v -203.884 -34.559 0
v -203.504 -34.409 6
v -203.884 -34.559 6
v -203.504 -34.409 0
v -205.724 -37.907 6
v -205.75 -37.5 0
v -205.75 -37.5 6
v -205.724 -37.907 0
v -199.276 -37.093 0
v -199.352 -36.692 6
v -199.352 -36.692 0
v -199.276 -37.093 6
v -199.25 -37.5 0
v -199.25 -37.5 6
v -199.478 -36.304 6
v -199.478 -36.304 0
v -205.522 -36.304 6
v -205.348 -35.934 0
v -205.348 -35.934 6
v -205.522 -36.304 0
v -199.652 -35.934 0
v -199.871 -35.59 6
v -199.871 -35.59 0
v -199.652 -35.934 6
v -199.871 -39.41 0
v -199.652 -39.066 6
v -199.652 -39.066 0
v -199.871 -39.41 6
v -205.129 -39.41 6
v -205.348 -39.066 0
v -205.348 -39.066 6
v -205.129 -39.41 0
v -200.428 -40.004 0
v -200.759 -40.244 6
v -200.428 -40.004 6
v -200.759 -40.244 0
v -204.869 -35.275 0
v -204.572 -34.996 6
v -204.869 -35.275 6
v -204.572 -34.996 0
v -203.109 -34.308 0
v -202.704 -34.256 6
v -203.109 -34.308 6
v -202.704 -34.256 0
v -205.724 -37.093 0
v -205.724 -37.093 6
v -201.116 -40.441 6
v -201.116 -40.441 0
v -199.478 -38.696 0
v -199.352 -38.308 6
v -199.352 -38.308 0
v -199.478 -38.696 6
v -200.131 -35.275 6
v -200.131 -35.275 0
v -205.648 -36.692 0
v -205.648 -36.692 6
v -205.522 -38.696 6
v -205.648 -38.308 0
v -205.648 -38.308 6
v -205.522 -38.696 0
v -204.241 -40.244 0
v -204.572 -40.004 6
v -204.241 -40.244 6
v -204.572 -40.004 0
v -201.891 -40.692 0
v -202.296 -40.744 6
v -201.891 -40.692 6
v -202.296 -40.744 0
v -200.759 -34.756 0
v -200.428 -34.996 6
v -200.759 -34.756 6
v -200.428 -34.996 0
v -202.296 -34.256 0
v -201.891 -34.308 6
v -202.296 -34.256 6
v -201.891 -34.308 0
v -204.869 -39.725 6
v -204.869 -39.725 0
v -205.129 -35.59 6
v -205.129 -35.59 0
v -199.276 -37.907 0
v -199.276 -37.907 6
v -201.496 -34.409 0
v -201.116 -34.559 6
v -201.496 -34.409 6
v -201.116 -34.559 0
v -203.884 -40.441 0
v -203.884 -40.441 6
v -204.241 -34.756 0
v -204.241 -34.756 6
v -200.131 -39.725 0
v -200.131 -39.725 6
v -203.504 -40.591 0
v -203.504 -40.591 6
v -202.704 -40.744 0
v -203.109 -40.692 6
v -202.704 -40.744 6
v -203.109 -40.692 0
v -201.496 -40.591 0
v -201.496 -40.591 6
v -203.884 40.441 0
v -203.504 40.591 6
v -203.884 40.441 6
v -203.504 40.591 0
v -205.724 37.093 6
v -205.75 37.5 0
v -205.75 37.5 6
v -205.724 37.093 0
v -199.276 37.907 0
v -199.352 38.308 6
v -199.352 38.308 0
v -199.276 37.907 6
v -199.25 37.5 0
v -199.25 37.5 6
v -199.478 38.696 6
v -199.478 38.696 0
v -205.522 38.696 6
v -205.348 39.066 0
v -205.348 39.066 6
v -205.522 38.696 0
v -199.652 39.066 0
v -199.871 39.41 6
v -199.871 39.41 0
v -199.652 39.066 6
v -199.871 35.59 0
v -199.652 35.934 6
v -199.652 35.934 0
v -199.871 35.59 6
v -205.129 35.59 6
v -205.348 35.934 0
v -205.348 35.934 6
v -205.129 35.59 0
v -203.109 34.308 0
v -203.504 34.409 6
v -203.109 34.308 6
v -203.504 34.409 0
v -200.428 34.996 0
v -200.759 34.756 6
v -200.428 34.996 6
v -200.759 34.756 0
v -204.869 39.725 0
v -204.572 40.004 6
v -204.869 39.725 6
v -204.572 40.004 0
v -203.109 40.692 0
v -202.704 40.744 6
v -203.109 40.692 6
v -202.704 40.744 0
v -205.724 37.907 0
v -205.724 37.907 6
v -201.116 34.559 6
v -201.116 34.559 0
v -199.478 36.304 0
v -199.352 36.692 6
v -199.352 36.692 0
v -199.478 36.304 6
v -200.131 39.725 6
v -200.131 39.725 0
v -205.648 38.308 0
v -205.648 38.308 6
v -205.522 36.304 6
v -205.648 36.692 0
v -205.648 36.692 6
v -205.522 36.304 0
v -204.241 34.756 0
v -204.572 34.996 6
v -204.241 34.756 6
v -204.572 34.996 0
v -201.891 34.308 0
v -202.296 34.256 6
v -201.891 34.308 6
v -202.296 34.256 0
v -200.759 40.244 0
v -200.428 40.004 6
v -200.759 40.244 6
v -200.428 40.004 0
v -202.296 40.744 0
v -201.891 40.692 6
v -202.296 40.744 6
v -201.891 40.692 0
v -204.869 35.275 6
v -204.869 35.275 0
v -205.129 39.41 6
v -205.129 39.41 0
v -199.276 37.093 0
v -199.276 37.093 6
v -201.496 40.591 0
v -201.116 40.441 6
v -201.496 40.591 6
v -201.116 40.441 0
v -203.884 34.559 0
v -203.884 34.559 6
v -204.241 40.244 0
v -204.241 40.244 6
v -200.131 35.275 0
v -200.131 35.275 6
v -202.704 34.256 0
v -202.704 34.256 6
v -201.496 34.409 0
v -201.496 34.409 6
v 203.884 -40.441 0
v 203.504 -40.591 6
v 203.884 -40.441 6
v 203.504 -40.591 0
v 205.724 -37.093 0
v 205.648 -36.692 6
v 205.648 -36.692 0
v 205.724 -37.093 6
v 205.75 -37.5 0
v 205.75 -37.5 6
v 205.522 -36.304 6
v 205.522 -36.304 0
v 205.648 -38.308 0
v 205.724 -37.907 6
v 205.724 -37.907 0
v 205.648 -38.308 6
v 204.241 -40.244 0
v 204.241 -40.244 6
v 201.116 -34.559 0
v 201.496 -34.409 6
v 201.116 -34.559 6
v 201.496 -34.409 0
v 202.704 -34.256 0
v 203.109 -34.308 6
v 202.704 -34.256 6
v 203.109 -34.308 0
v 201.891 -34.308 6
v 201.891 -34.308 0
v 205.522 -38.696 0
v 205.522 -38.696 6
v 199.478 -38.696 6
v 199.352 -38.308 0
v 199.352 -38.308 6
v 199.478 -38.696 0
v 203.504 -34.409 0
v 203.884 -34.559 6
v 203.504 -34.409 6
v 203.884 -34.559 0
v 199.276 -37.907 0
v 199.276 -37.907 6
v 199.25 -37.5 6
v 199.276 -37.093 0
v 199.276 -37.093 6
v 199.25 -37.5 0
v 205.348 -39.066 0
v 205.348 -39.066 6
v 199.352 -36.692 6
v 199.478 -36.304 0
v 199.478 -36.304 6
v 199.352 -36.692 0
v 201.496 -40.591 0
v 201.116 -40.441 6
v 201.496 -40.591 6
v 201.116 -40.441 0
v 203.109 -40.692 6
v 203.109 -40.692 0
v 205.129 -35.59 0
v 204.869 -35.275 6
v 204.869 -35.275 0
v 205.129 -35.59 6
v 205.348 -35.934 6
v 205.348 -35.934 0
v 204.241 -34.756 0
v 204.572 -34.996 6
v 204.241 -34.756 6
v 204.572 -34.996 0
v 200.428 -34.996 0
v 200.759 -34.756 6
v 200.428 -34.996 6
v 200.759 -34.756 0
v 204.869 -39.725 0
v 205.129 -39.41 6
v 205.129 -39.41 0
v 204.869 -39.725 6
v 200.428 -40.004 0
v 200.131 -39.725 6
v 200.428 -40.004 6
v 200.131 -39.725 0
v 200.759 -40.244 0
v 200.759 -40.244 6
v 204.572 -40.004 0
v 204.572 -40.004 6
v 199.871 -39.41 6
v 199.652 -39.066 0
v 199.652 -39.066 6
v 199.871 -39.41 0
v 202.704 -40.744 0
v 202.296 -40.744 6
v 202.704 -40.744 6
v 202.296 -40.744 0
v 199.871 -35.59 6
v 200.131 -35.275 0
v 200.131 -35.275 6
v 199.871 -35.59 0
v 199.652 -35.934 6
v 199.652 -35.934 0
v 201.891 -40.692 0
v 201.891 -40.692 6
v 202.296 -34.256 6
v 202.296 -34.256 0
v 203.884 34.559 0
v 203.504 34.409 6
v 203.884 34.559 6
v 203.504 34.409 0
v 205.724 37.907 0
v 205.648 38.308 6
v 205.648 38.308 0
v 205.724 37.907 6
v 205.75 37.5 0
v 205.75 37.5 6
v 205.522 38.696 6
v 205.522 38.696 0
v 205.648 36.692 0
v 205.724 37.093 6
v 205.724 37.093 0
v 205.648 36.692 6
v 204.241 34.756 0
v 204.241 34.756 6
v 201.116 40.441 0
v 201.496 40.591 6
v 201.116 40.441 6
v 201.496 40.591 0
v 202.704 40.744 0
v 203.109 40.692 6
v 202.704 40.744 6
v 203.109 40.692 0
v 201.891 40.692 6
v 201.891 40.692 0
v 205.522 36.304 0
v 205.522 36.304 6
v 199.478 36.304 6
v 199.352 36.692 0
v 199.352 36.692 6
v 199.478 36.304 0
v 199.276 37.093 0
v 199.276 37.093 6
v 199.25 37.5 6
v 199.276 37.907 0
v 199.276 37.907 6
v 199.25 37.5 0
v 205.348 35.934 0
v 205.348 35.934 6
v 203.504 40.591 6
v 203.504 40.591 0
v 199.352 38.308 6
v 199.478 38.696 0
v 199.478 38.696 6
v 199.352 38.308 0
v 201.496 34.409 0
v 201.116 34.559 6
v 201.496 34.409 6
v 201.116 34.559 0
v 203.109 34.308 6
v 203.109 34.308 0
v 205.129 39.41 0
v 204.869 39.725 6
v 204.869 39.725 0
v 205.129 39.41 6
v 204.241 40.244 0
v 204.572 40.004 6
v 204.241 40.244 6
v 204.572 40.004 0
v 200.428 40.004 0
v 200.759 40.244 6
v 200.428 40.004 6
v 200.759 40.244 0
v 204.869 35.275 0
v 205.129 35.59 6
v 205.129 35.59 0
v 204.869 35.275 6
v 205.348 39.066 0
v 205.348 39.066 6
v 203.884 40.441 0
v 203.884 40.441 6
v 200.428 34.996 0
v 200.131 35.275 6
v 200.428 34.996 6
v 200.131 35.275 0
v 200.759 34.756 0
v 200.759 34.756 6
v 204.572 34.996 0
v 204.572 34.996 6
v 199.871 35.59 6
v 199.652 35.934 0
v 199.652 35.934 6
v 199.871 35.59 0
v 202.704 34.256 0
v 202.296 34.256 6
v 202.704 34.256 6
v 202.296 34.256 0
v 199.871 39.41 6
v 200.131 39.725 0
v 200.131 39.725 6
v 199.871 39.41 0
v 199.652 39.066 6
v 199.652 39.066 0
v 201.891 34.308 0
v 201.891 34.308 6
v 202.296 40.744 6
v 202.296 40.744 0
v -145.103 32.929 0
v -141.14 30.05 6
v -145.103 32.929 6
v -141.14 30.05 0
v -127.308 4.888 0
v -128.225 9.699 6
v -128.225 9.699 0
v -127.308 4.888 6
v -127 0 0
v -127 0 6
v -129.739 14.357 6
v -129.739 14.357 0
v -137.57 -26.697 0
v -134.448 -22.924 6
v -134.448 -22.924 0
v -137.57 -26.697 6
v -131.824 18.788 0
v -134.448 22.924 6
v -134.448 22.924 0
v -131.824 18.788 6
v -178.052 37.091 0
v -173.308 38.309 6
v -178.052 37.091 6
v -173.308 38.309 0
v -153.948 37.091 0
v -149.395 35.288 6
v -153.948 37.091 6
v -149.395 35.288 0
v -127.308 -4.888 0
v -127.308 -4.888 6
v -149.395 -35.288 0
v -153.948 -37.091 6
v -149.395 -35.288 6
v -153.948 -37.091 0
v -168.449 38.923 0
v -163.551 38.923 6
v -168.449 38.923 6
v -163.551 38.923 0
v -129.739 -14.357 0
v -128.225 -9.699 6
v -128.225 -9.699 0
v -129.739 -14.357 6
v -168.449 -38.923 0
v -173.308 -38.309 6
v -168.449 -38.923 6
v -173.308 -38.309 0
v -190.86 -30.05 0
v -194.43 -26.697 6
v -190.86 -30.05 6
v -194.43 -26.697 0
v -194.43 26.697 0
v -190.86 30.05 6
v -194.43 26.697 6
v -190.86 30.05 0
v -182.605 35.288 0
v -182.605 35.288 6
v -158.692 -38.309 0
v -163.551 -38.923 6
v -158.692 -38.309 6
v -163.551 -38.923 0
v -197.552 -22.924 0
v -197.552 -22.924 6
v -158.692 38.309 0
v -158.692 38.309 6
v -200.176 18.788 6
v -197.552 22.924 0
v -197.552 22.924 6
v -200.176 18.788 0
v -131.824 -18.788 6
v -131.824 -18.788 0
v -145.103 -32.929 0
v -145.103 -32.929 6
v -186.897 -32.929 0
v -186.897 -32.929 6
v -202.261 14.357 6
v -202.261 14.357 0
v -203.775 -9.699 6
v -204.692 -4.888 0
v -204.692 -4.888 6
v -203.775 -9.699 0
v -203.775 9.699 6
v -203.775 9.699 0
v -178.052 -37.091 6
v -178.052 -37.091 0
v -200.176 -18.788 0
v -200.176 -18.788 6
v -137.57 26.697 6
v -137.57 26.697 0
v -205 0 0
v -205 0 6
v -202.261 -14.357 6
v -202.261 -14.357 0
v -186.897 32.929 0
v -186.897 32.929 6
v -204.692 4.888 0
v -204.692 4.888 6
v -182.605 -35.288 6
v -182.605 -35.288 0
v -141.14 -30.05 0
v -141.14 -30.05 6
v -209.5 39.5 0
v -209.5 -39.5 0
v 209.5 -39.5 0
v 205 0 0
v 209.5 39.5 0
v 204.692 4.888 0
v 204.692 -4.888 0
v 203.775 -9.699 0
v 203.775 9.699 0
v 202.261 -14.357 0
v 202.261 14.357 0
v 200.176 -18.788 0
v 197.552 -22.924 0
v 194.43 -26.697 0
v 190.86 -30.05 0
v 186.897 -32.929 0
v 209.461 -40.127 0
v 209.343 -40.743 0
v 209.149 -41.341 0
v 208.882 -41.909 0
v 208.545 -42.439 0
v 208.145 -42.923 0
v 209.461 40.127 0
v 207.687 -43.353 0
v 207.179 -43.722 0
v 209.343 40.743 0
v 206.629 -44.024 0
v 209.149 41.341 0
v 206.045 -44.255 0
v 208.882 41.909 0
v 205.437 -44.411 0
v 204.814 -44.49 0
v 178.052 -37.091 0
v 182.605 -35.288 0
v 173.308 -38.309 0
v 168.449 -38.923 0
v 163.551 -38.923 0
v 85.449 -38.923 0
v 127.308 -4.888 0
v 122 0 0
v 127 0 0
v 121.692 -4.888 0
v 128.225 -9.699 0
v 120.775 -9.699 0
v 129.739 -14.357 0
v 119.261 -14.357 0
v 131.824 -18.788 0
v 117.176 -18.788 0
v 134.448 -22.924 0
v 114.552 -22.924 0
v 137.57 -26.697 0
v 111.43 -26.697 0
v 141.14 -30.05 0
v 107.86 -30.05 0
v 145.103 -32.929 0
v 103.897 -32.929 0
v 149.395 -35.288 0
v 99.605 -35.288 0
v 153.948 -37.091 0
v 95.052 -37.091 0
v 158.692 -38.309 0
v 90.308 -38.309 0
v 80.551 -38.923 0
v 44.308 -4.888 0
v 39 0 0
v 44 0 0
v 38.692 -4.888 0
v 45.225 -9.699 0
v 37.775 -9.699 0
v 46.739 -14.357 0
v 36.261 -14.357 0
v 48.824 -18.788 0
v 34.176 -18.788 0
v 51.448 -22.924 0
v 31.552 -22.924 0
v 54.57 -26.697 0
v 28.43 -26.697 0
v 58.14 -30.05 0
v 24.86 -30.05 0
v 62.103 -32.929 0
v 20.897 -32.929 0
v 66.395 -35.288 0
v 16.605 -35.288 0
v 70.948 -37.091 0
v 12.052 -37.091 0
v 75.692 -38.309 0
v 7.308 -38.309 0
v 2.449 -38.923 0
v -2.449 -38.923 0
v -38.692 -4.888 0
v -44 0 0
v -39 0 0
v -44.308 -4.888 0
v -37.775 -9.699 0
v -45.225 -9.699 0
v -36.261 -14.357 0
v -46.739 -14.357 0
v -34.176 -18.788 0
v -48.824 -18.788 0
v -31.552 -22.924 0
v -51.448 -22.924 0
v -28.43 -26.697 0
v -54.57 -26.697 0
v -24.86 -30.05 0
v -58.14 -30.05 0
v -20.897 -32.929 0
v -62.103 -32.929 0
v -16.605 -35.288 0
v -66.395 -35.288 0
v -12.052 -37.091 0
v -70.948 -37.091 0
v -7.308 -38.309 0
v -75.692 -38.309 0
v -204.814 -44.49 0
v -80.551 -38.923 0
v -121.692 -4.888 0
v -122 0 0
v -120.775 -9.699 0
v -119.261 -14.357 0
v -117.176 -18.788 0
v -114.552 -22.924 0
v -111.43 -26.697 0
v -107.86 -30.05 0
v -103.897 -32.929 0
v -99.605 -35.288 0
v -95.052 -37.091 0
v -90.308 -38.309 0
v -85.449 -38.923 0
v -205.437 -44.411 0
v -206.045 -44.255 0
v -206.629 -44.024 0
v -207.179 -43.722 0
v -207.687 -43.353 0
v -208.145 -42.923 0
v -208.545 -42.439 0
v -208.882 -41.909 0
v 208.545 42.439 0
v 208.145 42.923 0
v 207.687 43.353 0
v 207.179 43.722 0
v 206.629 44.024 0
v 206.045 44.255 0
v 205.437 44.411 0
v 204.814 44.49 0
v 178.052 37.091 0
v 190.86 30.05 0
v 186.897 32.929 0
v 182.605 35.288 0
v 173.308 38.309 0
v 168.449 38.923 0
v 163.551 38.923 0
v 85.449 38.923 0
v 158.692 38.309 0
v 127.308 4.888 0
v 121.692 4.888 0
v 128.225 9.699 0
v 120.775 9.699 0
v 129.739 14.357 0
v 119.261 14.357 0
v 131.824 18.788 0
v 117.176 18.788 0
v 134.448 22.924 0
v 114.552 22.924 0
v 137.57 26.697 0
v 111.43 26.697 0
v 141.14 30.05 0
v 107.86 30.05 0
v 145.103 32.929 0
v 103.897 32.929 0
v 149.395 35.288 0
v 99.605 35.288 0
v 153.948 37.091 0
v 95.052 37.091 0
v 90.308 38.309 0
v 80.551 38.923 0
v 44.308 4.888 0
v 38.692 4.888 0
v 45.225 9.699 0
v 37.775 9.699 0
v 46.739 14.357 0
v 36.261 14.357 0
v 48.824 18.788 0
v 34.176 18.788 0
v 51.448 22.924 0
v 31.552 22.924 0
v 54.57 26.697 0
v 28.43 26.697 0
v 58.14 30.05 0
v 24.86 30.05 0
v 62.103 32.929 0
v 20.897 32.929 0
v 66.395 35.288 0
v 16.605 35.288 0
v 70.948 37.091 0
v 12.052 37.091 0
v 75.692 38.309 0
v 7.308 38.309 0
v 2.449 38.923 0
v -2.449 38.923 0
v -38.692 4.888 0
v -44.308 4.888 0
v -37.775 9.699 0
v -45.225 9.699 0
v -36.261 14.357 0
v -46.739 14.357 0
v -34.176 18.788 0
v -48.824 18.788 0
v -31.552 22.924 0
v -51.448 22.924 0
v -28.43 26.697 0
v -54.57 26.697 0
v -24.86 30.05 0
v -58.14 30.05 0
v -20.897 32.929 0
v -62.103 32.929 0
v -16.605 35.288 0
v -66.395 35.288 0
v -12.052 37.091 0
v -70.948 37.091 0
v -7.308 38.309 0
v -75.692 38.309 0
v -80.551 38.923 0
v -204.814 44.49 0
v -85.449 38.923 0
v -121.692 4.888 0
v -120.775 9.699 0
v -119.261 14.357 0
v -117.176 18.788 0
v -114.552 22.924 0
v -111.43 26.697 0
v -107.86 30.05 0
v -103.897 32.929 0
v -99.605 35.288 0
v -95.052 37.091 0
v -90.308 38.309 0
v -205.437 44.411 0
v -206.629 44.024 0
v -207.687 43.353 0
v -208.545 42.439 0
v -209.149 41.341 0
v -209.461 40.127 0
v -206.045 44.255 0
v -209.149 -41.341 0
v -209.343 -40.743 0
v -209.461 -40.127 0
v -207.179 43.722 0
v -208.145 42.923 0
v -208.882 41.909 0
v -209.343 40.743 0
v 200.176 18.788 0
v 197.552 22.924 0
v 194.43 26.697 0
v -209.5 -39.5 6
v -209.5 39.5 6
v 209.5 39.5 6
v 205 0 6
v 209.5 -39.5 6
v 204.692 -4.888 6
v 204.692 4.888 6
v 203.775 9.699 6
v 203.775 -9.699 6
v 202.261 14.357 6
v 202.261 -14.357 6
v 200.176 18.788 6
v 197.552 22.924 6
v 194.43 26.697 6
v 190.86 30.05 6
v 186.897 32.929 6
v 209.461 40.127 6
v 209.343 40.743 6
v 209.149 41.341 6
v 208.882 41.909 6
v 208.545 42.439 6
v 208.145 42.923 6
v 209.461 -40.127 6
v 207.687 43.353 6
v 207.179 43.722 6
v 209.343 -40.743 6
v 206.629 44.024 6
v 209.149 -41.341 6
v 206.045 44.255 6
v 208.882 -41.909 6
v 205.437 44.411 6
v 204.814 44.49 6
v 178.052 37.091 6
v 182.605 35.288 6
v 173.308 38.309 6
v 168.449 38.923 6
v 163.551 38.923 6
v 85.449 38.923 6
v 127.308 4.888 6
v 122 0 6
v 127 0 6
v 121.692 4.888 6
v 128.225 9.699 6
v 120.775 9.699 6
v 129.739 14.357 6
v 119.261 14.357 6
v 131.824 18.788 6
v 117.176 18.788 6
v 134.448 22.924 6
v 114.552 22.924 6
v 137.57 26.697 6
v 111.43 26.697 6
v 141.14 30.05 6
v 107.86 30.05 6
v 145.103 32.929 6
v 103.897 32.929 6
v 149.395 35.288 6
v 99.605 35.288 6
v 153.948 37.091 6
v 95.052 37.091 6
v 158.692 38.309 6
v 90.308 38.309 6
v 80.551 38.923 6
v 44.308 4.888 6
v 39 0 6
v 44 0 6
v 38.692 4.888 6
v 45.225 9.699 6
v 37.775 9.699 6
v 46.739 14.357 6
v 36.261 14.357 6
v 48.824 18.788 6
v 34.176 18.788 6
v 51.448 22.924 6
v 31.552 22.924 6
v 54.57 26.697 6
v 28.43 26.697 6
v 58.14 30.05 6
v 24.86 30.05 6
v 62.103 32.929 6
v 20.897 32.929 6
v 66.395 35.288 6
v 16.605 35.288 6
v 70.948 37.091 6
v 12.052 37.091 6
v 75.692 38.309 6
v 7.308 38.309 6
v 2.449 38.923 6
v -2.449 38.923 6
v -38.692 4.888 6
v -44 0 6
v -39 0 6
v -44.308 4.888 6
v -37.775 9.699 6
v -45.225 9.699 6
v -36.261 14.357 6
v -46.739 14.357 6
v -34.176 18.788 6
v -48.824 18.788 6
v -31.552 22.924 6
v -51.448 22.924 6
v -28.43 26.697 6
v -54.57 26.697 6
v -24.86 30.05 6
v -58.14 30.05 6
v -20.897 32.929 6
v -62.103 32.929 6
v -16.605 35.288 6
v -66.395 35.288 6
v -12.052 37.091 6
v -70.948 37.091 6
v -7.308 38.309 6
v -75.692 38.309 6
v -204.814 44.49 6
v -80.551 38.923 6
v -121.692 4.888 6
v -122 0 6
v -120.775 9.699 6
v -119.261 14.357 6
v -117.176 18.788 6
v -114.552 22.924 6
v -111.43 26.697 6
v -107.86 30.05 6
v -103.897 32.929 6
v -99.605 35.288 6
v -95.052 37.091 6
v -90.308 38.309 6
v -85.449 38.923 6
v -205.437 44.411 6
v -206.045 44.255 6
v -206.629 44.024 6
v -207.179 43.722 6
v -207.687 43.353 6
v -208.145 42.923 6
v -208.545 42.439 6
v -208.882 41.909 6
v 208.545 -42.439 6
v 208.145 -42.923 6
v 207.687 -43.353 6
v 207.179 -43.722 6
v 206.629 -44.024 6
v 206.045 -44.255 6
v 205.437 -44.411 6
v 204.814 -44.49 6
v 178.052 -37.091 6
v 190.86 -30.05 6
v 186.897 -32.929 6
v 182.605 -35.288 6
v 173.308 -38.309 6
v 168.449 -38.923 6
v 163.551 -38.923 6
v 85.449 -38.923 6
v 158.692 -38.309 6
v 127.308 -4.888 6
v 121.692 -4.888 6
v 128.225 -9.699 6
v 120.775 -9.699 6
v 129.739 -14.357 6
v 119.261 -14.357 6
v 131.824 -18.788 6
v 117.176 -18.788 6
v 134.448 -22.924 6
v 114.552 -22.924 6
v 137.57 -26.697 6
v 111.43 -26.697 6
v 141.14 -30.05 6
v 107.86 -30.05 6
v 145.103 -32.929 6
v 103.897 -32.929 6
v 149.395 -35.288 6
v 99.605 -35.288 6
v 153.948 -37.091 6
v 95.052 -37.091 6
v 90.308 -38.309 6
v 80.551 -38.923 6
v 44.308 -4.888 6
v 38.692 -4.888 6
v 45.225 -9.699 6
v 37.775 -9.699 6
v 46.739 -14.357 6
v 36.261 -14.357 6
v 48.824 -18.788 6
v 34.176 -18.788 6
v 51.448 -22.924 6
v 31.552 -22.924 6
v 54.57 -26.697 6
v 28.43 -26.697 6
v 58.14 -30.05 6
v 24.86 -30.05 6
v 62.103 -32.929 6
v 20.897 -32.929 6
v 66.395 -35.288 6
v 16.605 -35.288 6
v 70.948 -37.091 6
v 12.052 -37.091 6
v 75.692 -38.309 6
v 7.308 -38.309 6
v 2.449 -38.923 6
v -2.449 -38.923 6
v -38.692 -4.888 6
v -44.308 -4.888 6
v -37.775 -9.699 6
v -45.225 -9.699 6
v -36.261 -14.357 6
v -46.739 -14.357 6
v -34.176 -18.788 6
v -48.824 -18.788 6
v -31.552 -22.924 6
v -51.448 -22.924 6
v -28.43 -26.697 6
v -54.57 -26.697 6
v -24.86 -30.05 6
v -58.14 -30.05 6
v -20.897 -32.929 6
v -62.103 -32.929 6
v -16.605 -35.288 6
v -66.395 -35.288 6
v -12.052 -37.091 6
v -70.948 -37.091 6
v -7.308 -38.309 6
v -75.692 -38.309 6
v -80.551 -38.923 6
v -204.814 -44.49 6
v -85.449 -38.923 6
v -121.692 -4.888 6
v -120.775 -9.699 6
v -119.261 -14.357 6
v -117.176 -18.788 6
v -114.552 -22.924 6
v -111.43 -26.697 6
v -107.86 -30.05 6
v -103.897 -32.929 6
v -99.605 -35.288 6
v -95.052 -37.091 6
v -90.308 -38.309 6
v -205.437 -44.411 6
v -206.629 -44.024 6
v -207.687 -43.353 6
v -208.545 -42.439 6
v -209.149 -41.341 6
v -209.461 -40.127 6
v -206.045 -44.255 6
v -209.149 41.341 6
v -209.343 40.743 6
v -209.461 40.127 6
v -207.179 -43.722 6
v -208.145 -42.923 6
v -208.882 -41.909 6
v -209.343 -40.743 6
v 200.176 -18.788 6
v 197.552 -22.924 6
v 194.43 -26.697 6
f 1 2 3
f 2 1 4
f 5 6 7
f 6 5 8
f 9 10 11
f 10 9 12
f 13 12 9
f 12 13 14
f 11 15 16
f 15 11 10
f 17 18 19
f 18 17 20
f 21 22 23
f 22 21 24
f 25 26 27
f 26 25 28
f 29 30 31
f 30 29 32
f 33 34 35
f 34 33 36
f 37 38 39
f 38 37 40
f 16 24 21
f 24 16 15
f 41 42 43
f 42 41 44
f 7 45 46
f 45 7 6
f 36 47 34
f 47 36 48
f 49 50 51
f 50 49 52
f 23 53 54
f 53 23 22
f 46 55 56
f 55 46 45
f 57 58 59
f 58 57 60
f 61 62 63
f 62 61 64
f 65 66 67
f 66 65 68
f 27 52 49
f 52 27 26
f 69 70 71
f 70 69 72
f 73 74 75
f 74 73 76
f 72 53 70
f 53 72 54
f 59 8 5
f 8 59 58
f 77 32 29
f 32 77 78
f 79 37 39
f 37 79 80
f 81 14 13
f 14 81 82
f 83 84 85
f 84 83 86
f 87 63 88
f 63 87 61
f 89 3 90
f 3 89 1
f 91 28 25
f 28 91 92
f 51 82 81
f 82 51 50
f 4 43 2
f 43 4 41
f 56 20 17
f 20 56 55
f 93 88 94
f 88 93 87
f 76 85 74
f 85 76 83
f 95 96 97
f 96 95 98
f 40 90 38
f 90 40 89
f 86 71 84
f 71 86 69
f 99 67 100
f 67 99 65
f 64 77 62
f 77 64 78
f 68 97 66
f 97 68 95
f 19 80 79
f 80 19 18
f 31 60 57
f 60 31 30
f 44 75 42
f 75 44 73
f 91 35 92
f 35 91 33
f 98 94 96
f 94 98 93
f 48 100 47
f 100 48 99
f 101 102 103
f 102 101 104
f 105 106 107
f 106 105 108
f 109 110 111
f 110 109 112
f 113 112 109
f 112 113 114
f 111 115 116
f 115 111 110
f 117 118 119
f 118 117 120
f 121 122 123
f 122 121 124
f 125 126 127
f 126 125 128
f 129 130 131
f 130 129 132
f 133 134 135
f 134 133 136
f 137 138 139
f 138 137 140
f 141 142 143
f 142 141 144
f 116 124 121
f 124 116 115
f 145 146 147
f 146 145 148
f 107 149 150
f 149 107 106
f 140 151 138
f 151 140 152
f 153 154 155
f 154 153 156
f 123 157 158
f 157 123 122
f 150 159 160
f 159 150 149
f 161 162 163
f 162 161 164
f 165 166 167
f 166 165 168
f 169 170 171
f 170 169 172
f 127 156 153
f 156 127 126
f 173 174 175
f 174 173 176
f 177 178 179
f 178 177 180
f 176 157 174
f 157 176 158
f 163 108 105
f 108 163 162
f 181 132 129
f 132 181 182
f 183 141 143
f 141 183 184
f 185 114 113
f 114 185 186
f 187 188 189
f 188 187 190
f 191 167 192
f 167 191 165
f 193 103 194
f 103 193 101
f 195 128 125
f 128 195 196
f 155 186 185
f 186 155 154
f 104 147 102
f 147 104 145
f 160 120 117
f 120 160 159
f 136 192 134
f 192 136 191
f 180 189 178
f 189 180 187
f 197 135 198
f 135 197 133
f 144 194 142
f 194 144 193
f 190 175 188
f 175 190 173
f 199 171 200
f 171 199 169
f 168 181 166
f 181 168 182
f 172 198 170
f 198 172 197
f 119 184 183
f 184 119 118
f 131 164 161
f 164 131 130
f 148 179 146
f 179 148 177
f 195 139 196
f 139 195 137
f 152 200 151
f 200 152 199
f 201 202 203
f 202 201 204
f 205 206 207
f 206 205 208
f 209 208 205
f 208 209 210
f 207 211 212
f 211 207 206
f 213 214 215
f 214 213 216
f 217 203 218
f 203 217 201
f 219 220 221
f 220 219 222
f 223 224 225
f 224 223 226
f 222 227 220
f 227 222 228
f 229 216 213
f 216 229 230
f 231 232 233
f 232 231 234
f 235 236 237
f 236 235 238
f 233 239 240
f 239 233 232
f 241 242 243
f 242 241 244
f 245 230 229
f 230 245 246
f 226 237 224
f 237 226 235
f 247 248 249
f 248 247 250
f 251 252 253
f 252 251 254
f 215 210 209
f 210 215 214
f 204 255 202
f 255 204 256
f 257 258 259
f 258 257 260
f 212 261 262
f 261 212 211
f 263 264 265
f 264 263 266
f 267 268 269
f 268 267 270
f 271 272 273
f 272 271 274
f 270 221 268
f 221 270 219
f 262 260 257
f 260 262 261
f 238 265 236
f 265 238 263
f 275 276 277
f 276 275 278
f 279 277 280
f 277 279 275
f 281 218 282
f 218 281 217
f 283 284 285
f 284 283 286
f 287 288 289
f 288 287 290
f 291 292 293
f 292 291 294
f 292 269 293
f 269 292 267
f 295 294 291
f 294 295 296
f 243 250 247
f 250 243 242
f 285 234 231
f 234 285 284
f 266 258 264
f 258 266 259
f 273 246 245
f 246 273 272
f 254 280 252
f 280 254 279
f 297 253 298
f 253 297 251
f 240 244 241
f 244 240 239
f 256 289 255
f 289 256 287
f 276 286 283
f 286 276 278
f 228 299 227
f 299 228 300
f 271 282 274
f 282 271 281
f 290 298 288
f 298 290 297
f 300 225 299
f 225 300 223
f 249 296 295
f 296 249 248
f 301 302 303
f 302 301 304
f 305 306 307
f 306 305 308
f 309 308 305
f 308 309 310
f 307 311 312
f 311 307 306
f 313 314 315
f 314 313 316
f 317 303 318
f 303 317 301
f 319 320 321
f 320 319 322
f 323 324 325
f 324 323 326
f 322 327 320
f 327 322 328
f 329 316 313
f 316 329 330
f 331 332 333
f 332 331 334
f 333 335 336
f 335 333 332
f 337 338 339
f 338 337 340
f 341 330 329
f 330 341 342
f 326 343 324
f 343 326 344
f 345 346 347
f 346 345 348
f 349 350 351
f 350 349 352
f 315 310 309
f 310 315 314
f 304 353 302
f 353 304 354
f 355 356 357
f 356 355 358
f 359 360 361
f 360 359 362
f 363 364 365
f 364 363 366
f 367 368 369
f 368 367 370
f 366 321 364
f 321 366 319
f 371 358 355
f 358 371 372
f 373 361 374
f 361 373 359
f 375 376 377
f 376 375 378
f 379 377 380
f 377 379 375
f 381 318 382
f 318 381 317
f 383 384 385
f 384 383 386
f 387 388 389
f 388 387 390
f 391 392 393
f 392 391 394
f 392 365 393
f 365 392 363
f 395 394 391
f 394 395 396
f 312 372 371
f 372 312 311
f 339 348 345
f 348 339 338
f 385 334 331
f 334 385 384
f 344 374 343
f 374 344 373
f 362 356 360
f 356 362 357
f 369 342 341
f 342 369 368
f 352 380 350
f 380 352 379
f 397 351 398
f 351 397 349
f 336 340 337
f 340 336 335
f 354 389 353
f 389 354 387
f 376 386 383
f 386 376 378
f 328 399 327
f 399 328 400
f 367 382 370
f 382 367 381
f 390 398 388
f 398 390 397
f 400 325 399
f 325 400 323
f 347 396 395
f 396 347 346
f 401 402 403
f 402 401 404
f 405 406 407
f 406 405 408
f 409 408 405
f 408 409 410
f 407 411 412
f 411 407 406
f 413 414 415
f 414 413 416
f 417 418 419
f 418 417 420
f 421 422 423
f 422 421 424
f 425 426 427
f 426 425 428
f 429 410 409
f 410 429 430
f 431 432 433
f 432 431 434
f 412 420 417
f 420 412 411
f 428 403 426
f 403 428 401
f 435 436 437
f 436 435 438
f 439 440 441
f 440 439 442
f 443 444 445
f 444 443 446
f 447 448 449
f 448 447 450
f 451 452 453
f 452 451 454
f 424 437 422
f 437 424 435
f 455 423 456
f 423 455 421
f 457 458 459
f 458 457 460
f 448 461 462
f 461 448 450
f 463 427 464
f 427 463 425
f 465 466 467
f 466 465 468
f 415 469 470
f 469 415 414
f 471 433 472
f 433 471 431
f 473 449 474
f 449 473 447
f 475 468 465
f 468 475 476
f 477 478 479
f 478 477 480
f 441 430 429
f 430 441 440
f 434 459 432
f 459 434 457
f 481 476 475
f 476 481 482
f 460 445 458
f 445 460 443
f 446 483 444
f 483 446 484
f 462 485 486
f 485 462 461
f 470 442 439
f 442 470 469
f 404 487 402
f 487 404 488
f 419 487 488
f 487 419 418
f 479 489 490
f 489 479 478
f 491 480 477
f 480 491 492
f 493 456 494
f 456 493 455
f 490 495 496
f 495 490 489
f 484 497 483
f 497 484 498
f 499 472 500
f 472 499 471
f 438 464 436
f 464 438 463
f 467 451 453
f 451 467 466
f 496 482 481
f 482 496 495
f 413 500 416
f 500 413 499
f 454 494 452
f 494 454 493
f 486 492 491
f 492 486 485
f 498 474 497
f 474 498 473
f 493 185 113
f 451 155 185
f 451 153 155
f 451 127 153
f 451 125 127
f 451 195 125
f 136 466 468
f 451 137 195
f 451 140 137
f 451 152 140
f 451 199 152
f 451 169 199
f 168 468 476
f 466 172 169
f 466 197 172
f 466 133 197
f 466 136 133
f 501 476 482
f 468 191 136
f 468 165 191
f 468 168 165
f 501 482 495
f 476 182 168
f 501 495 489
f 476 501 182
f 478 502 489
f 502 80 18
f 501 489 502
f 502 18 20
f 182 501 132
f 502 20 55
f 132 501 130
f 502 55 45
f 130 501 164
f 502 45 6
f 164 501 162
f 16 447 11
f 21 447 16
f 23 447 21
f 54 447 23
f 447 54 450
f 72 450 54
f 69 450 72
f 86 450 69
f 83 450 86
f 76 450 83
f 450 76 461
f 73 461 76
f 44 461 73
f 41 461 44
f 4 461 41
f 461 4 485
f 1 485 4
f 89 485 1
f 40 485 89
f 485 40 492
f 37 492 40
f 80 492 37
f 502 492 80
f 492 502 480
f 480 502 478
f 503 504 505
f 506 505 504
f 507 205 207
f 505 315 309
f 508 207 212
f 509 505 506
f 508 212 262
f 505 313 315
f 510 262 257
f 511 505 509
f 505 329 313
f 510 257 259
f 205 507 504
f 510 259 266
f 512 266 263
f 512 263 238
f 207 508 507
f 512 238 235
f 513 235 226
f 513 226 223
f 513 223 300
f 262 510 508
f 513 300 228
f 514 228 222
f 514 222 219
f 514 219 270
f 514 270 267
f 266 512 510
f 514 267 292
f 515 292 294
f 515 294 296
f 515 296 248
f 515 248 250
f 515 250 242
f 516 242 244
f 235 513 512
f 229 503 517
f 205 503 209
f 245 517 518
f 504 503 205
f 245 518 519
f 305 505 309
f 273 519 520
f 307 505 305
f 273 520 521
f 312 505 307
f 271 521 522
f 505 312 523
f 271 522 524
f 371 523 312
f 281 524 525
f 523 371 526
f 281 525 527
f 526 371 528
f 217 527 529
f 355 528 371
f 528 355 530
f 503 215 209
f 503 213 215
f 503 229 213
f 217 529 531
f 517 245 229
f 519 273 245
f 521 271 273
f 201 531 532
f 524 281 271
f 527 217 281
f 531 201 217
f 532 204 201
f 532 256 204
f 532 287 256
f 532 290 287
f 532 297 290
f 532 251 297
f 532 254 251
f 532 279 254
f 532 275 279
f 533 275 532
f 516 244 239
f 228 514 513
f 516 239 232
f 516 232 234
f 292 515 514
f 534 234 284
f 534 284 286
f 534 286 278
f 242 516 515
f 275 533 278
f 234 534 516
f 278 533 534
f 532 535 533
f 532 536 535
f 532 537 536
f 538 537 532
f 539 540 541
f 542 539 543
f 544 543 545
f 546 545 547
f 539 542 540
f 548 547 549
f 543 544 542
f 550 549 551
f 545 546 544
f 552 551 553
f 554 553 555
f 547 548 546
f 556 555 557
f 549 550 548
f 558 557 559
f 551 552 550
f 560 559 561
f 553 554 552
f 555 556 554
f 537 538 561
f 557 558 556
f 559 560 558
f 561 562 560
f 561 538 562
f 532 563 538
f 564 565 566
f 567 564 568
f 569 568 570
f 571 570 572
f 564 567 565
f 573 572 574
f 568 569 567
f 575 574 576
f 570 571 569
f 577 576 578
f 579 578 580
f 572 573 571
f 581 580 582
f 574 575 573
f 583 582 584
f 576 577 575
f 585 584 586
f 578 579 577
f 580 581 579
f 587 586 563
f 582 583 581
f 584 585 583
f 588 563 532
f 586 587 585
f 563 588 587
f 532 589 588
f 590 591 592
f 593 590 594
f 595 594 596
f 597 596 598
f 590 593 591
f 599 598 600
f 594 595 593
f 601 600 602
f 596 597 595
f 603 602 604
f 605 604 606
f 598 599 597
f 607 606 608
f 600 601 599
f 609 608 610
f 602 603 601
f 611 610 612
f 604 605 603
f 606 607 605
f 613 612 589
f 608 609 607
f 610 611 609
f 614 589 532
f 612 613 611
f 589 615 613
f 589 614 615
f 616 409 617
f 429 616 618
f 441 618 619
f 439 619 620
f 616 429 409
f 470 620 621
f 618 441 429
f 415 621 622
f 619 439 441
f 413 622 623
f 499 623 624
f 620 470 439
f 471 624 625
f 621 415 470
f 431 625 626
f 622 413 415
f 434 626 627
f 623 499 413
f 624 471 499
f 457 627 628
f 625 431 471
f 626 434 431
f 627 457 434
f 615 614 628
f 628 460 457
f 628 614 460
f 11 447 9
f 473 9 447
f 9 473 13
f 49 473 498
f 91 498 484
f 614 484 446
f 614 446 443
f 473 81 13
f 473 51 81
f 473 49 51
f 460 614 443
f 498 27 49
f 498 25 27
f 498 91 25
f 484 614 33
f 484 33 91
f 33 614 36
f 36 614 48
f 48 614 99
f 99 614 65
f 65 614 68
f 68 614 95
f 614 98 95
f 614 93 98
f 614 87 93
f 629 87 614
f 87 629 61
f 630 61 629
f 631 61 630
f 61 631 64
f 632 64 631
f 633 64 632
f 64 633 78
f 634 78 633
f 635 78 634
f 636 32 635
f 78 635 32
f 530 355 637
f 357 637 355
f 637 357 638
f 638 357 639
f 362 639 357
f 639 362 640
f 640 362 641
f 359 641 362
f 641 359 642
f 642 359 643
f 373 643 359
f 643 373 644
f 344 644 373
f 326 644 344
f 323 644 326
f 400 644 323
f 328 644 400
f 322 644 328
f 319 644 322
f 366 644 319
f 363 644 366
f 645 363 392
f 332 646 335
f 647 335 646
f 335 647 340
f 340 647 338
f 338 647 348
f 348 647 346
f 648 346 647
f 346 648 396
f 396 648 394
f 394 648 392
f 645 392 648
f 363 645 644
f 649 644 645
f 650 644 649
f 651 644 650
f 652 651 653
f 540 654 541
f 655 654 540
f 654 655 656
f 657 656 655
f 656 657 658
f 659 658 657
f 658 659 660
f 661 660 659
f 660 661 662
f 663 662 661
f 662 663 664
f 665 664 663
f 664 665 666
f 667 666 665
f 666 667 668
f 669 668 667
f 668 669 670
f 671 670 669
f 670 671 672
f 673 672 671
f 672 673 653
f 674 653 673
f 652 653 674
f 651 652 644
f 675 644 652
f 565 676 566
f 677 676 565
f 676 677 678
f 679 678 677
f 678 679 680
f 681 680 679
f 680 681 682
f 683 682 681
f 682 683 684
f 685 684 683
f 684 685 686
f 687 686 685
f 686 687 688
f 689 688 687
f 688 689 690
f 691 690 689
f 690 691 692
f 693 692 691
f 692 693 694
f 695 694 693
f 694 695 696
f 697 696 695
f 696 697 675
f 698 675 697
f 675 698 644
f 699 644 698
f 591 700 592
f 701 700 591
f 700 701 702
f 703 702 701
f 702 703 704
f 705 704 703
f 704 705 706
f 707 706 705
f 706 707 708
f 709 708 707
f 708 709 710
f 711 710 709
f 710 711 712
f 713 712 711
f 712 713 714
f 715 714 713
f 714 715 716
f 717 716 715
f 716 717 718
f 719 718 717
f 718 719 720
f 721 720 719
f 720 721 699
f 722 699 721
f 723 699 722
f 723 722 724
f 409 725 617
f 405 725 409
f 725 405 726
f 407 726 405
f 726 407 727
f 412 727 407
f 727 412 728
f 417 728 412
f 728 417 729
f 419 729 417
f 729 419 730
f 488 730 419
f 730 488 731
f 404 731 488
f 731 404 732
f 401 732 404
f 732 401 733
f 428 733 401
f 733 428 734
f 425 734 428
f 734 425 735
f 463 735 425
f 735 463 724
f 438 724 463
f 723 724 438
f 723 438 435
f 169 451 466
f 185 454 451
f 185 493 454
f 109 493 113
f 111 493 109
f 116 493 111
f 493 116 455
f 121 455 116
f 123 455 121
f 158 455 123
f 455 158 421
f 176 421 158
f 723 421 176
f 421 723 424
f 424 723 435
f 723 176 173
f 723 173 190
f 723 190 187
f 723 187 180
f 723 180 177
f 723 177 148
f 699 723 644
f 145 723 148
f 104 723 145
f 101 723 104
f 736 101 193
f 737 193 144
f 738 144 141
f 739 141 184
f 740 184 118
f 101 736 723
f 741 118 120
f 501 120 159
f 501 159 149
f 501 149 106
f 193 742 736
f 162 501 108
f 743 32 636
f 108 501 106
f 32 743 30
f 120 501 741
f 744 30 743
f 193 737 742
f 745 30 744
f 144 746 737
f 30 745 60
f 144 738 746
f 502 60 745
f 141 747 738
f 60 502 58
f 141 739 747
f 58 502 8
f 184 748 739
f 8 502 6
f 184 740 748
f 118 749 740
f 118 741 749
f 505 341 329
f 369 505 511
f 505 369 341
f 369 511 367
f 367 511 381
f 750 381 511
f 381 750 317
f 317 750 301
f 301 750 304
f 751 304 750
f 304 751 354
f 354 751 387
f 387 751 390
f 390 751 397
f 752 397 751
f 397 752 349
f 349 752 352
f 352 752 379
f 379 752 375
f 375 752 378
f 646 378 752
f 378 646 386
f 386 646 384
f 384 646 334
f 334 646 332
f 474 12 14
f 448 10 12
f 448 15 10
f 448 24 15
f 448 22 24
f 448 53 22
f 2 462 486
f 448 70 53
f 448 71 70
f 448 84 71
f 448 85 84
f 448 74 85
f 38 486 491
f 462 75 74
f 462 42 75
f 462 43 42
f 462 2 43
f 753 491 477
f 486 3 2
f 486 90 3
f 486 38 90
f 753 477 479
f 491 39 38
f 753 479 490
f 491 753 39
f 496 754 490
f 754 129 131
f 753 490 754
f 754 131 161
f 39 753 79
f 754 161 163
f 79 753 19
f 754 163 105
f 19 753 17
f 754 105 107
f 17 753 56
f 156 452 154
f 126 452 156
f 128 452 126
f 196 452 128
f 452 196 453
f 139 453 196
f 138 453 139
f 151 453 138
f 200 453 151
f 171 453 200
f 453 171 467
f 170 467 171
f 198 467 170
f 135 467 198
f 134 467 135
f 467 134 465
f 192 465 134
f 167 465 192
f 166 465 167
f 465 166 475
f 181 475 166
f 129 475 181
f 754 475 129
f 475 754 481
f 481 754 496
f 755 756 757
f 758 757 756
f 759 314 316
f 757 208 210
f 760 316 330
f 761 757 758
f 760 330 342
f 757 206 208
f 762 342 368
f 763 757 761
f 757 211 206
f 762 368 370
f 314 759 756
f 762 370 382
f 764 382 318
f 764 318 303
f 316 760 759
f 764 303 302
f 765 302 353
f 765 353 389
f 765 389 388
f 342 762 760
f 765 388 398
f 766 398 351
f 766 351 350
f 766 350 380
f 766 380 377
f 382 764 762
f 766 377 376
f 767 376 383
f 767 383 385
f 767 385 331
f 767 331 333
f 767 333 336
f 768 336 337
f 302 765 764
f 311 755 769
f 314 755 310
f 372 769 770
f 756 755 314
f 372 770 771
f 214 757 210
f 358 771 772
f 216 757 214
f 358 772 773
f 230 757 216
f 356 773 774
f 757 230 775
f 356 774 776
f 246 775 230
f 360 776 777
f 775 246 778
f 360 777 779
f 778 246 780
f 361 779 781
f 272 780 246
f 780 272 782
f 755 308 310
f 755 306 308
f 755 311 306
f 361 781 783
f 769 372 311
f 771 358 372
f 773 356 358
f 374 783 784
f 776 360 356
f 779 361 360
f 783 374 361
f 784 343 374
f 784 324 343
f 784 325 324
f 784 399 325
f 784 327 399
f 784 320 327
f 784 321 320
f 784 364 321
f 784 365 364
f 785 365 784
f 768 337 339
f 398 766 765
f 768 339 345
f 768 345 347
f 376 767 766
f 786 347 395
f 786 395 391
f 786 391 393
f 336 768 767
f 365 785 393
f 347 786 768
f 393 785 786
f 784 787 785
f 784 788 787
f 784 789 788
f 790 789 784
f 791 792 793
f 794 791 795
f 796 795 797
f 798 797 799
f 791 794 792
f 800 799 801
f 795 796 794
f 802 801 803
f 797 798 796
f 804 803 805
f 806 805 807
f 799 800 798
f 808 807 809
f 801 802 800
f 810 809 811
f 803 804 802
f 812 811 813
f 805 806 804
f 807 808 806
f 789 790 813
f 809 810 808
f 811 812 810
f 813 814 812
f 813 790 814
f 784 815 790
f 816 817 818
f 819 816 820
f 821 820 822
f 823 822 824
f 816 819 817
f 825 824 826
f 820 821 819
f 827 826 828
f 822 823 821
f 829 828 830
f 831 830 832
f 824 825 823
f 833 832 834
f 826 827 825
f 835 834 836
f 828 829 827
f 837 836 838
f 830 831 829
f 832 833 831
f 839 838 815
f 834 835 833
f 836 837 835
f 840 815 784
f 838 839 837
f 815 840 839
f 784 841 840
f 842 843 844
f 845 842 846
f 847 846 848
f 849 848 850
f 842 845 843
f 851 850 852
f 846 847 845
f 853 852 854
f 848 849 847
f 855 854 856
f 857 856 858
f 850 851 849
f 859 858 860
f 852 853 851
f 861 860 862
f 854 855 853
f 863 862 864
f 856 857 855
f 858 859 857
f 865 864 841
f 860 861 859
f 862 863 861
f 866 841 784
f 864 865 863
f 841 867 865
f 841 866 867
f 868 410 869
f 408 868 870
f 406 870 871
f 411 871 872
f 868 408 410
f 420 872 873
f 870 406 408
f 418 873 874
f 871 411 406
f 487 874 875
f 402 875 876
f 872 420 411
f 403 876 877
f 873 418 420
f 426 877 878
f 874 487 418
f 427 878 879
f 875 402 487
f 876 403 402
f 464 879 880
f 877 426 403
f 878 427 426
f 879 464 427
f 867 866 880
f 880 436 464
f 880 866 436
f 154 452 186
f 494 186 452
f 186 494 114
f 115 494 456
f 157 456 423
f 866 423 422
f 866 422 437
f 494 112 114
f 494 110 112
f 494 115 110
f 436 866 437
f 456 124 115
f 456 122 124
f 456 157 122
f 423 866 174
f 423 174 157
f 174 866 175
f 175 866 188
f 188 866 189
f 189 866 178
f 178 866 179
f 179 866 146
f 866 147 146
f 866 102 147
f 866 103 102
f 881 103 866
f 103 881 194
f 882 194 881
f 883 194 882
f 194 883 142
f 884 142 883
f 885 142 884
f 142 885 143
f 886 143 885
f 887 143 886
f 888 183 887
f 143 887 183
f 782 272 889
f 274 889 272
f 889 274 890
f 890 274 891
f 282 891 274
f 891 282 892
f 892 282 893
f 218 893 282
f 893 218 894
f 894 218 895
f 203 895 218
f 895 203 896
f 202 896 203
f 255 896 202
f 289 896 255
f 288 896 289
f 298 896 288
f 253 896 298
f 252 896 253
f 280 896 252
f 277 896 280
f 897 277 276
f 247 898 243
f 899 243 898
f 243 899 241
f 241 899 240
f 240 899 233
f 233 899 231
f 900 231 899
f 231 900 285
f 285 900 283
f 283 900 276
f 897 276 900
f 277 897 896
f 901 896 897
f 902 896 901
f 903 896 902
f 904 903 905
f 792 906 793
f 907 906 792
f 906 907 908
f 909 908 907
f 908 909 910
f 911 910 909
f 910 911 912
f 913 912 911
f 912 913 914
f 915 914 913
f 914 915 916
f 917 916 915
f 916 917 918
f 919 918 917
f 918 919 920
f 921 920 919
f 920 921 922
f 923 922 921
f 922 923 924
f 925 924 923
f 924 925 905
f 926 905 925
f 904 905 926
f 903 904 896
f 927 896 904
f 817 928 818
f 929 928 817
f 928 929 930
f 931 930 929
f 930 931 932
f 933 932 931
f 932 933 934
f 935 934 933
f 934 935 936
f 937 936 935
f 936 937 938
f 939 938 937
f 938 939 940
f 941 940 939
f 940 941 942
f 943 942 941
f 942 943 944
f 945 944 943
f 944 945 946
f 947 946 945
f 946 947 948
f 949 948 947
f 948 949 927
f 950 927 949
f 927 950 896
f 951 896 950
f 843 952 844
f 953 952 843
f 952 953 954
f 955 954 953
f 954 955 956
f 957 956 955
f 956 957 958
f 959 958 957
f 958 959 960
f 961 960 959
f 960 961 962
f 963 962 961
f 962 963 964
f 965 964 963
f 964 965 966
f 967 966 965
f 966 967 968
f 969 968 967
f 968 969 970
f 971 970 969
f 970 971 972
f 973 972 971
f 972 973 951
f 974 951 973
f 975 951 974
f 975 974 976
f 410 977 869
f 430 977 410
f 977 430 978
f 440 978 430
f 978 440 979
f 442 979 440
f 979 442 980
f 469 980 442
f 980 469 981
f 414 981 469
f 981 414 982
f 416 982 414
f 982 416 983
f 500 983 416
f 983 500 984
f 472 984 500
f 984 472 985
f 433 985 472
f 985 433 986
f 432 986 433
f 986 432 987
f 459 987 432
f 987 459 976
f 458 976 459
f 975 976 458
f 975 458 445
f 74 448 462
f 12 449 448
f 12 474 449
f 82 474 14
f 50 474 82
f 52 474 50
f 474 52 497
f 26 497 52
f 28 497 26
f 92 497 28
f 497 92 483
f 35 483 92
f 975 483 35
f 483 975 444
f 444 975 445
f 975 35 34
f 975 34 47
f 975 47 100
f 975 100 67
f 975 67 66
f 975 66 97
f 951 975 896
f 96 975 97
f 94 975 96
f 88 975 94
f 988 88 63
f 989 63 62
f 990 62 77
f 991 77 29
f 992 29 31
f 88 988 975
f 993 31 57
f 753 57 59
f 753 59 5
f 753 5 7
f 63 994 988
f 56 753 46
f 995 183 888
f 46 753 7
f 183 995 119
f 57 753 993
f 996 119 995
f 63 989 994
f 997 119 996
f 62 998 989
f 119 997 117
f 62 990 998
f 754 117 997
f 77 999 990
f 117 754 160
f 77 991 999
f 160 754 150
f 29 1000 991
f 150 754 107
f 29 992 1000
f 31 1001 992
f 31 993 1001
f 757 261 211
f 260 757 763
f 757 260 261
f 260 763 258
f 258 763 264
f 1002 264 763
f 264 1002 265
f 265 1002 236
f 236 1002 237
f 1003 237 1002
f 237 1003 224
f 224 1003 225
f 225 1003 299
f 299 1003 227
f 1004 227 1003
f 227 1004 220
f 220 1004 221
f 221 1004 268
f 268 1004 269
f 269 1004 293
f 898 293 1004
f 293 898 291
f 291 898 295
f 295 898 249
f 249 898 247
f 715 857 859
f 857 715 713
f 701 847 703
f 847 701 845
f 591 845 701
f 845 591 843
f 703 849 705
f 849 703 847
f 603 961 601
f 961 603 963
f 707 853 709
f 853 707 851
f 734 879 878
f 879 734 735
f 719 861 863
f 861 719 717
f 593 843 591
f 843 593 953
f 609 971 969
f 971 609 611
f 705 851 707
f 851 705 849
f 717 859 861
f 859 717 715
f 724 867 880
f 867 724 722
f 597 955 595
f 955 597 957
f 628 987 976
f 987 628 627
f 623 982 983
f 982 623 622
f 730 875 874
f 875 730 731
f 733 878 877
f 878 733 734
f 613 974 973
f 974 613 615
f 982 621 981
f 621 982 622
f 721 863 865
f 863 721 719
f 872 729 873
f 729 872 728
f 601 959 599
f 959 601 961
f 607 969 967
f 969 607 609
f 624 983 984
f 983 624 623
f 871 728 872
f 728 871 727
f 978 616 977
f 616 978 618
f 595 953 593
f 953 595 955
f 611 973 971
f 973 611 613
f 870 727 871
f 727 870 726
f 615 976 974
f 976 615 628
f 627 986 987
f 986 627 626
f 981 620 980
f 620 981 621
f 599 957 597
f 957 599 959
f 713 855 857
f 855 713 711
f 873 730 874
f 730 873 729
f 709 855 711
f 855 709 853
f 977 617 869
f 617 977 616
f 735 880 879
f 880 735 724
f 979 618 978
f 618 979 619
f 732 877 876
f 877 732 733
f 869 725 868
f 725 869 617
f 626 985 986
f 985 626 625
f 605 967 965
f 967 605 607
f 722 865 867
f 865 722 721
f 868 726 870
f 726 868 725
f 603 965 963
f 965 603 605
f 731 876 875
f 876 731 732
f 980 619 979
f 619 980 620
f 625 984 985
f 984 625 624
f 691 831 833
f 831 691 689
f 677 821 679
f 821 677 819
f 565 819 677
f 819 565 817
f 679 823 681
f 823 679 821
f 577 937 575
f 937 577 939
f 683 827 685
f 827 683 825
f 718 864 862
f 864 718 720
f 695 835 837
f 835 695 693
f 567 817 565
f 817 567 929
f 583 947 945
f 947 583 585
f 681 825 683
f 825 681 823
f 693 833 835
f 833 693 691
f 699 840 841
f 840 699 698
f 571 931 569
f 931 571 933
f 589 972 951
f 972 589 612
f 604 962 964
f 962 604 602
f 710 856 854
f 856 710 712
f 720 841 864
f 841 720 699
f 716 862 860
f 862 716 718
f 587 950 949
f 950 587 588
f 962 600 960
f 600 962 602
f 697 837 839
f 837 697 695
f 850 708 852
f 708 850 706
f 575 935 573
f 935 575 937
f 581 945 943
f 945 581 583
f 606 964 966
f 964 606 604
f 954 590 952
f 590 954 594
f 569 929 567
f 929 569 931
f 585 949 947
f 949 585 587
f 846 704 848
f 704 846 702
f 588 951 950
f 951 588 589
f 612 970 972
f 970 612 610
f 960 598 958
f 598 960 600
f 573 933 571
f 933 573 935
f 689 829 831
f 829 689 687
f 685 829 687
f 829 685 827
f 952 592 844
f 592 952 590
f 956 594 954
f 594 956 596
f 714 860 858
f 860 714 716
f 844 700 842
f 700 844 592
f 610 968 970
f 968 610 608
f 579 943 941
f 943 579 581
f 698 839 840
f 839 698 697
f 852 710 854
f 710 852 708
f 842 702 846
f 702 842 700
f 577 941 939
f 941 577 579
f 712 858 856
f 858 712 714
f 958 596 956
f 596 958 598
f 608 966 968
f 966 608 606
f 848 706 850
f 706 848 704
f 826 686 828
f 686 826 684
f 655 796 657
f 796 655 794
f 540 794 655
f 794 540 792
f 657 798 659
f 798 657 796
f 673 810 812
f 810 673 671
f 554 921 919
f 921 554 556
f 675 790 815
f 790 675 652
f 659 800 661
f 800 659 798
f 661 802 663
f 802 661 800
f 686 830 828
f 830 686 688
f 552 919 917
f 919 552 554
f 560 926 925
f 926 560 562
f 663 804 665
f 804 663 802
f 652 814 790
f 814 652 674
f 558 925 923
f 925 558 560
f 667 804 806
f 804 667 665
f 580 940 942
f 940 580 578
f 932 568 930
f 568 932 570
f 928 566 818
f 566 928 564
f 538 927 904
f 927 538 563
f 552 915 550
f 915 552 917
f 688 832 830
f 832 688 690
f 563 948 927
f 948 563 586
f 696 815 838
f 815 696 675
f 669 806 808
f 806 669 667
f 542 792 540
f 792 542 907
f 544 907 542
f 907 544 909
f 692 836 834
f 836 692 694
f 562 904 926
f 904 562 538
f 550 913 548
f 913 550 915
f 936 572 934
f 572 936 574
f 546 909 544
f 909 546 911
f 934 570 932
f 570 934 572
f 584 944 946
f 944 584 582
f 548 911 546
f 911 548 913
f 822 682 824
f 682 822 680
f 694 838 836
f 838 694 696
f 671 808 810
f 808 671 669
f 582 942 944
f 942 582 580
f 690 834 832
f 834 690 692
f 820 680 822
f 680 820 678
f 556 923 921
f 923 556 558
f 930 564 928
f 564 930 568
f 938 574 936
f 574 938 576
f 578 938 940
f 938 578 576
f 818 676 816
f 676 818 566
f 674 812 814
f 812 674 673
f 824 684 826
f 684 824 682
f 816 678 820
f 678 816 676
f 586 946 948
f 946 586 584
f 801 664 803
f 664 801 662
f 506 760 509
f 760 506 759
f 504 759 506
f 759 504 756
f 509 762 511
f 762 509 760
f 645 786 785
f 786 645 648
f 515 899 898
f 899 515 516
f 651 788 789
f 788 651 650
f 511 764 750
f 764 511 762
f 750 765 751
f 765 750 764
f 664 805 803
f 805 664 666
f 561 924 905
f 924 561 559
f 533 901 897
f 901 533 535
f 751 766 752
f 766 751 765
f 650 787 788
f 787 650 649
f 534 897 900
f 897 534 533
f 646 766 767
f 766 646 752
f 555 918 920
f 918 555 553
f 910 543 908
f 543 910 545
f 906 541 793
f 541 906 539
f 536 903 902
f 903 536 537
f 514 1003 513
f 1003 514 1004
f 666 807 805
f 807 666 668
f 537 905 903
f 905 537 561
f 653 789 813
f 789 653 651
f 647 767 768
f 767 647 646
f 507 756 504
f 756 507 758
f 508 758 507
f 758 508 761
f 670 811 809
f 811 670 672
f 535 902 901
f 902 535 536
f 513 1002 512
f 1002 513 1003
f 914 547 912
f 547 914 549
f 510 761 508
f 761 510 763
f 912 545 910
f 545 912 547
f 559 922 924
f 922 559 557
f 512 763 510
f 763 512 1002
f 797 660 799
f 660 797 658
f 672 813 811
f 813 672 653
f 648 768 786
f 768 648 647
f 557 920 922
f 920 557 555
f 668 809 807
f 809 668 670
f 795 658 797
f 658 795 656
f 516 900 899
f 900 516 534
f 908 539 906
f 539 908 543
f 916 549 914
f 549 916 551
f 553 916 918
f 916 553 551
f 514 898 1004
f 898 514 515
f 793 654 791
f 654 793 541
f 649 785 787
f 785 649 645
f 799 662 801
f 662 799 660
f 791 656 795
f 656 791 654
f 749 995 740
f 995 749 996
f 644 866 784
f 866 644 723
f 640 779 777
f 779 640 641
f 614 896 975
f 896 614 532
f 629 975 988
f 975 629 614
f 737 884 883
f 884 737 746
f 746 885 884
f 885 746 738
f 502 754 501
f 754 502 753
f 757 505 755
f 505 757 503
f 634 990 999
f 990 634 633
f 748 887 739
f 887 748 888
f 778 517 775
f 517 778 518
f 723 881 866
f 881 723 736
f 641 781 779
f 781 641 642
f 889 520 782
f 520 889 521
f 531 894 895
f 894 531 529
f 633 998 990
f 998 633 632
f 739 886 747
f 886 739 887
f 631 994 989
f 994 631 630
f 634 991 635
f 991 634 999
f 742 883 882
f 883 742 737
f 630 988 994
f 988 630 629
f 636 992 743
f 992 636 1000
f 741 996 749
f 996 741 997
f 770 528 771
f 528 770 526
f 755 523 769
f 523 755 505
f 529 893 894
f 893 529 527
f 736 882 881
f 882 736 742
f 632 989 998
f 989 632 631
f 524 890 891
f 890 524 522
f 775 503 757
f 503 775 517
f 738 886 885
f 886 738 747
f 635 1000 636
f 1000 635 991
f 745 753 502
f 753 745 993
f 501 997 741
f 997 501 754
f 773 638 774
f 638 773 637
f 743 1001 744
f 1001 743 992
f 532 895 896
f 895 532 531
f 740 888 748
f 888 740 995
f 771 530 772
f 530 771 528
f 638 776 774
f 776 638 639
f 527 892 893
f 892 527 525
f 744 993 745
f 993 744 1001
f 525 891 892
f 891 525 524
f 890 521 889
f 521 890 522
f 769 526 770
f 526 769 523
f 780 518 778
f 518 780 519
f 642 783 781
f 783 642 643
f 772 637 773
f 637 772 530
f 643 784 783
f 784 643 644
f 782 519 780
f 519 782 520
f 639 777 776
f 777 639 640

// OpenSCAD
$fn = 50;

difference() {
	union() {
		hull() {
			translate(v = [-204.5, 39.5, 0]) {
				cylinder(h = 6, r = 5);
			}
			translate(v = [204.5, 39.5, 0]) {
				cylinder(h = 6, r = 5);
			}
			translate(v = [-204.5, -39.5, 0]) {
				cylinder(h = 6, r = 5);
			}
			translate(v = [204.5, -39.5, 0]) {
				cylinder(h = 6, r = 5);
			}
		}
	}
	union() {
		translate(v = [-202.5, -37.5, -100.0]) {
			cylinder(h = 200, r = 3.25);
		}
		translate(v = [-202.5, 37.5, -100.0]) {
			cylinder(h = 200, r = 3.25);
		}
		translate(v = [202.5, -37.5, -100.0]) {
			cylinder(h = 200, r = 3.25);
		}
		translate(v = [202.5, 37.5, -100.0]) {
			cylinder(h = 200, r = 3.25);
		}
		translate(v = [-202.5, -37.5, -100.0]) {
			cylinder(h = 200, r = 1.8);
		}
		translate(v = [-202.5, 37.5, -100.0]) {
			cylinder(h = 200, r = 1.8);
		}
		translate(v = [202.5, -37.5, -100.0]) {
			cylinder(h = 200, r = 1.8);
		}
		translate(v = [202.5, 37.5, -100.0]) {
			cylinder(h = 200, r = 1.8);
		}
		translate(v = [-166.0, 0, 0.0]) {
			cylinder(h = 6, r = 39.0);
		}
		translate(v = [-83.0, 0, 0.0]) {
			cylinder(h = 6, r = 39.0);
		}
		cylinder(h = 6, r = 39.0);
		translate(v = [83.0, 0, 0.0]) {
			cylinder(h = 6, r = 39.0);
		}
		translate(v = [166.0, 0, 0.0]) {
			cylinder(h = 6, r = 39.0);
		}
	}
}
